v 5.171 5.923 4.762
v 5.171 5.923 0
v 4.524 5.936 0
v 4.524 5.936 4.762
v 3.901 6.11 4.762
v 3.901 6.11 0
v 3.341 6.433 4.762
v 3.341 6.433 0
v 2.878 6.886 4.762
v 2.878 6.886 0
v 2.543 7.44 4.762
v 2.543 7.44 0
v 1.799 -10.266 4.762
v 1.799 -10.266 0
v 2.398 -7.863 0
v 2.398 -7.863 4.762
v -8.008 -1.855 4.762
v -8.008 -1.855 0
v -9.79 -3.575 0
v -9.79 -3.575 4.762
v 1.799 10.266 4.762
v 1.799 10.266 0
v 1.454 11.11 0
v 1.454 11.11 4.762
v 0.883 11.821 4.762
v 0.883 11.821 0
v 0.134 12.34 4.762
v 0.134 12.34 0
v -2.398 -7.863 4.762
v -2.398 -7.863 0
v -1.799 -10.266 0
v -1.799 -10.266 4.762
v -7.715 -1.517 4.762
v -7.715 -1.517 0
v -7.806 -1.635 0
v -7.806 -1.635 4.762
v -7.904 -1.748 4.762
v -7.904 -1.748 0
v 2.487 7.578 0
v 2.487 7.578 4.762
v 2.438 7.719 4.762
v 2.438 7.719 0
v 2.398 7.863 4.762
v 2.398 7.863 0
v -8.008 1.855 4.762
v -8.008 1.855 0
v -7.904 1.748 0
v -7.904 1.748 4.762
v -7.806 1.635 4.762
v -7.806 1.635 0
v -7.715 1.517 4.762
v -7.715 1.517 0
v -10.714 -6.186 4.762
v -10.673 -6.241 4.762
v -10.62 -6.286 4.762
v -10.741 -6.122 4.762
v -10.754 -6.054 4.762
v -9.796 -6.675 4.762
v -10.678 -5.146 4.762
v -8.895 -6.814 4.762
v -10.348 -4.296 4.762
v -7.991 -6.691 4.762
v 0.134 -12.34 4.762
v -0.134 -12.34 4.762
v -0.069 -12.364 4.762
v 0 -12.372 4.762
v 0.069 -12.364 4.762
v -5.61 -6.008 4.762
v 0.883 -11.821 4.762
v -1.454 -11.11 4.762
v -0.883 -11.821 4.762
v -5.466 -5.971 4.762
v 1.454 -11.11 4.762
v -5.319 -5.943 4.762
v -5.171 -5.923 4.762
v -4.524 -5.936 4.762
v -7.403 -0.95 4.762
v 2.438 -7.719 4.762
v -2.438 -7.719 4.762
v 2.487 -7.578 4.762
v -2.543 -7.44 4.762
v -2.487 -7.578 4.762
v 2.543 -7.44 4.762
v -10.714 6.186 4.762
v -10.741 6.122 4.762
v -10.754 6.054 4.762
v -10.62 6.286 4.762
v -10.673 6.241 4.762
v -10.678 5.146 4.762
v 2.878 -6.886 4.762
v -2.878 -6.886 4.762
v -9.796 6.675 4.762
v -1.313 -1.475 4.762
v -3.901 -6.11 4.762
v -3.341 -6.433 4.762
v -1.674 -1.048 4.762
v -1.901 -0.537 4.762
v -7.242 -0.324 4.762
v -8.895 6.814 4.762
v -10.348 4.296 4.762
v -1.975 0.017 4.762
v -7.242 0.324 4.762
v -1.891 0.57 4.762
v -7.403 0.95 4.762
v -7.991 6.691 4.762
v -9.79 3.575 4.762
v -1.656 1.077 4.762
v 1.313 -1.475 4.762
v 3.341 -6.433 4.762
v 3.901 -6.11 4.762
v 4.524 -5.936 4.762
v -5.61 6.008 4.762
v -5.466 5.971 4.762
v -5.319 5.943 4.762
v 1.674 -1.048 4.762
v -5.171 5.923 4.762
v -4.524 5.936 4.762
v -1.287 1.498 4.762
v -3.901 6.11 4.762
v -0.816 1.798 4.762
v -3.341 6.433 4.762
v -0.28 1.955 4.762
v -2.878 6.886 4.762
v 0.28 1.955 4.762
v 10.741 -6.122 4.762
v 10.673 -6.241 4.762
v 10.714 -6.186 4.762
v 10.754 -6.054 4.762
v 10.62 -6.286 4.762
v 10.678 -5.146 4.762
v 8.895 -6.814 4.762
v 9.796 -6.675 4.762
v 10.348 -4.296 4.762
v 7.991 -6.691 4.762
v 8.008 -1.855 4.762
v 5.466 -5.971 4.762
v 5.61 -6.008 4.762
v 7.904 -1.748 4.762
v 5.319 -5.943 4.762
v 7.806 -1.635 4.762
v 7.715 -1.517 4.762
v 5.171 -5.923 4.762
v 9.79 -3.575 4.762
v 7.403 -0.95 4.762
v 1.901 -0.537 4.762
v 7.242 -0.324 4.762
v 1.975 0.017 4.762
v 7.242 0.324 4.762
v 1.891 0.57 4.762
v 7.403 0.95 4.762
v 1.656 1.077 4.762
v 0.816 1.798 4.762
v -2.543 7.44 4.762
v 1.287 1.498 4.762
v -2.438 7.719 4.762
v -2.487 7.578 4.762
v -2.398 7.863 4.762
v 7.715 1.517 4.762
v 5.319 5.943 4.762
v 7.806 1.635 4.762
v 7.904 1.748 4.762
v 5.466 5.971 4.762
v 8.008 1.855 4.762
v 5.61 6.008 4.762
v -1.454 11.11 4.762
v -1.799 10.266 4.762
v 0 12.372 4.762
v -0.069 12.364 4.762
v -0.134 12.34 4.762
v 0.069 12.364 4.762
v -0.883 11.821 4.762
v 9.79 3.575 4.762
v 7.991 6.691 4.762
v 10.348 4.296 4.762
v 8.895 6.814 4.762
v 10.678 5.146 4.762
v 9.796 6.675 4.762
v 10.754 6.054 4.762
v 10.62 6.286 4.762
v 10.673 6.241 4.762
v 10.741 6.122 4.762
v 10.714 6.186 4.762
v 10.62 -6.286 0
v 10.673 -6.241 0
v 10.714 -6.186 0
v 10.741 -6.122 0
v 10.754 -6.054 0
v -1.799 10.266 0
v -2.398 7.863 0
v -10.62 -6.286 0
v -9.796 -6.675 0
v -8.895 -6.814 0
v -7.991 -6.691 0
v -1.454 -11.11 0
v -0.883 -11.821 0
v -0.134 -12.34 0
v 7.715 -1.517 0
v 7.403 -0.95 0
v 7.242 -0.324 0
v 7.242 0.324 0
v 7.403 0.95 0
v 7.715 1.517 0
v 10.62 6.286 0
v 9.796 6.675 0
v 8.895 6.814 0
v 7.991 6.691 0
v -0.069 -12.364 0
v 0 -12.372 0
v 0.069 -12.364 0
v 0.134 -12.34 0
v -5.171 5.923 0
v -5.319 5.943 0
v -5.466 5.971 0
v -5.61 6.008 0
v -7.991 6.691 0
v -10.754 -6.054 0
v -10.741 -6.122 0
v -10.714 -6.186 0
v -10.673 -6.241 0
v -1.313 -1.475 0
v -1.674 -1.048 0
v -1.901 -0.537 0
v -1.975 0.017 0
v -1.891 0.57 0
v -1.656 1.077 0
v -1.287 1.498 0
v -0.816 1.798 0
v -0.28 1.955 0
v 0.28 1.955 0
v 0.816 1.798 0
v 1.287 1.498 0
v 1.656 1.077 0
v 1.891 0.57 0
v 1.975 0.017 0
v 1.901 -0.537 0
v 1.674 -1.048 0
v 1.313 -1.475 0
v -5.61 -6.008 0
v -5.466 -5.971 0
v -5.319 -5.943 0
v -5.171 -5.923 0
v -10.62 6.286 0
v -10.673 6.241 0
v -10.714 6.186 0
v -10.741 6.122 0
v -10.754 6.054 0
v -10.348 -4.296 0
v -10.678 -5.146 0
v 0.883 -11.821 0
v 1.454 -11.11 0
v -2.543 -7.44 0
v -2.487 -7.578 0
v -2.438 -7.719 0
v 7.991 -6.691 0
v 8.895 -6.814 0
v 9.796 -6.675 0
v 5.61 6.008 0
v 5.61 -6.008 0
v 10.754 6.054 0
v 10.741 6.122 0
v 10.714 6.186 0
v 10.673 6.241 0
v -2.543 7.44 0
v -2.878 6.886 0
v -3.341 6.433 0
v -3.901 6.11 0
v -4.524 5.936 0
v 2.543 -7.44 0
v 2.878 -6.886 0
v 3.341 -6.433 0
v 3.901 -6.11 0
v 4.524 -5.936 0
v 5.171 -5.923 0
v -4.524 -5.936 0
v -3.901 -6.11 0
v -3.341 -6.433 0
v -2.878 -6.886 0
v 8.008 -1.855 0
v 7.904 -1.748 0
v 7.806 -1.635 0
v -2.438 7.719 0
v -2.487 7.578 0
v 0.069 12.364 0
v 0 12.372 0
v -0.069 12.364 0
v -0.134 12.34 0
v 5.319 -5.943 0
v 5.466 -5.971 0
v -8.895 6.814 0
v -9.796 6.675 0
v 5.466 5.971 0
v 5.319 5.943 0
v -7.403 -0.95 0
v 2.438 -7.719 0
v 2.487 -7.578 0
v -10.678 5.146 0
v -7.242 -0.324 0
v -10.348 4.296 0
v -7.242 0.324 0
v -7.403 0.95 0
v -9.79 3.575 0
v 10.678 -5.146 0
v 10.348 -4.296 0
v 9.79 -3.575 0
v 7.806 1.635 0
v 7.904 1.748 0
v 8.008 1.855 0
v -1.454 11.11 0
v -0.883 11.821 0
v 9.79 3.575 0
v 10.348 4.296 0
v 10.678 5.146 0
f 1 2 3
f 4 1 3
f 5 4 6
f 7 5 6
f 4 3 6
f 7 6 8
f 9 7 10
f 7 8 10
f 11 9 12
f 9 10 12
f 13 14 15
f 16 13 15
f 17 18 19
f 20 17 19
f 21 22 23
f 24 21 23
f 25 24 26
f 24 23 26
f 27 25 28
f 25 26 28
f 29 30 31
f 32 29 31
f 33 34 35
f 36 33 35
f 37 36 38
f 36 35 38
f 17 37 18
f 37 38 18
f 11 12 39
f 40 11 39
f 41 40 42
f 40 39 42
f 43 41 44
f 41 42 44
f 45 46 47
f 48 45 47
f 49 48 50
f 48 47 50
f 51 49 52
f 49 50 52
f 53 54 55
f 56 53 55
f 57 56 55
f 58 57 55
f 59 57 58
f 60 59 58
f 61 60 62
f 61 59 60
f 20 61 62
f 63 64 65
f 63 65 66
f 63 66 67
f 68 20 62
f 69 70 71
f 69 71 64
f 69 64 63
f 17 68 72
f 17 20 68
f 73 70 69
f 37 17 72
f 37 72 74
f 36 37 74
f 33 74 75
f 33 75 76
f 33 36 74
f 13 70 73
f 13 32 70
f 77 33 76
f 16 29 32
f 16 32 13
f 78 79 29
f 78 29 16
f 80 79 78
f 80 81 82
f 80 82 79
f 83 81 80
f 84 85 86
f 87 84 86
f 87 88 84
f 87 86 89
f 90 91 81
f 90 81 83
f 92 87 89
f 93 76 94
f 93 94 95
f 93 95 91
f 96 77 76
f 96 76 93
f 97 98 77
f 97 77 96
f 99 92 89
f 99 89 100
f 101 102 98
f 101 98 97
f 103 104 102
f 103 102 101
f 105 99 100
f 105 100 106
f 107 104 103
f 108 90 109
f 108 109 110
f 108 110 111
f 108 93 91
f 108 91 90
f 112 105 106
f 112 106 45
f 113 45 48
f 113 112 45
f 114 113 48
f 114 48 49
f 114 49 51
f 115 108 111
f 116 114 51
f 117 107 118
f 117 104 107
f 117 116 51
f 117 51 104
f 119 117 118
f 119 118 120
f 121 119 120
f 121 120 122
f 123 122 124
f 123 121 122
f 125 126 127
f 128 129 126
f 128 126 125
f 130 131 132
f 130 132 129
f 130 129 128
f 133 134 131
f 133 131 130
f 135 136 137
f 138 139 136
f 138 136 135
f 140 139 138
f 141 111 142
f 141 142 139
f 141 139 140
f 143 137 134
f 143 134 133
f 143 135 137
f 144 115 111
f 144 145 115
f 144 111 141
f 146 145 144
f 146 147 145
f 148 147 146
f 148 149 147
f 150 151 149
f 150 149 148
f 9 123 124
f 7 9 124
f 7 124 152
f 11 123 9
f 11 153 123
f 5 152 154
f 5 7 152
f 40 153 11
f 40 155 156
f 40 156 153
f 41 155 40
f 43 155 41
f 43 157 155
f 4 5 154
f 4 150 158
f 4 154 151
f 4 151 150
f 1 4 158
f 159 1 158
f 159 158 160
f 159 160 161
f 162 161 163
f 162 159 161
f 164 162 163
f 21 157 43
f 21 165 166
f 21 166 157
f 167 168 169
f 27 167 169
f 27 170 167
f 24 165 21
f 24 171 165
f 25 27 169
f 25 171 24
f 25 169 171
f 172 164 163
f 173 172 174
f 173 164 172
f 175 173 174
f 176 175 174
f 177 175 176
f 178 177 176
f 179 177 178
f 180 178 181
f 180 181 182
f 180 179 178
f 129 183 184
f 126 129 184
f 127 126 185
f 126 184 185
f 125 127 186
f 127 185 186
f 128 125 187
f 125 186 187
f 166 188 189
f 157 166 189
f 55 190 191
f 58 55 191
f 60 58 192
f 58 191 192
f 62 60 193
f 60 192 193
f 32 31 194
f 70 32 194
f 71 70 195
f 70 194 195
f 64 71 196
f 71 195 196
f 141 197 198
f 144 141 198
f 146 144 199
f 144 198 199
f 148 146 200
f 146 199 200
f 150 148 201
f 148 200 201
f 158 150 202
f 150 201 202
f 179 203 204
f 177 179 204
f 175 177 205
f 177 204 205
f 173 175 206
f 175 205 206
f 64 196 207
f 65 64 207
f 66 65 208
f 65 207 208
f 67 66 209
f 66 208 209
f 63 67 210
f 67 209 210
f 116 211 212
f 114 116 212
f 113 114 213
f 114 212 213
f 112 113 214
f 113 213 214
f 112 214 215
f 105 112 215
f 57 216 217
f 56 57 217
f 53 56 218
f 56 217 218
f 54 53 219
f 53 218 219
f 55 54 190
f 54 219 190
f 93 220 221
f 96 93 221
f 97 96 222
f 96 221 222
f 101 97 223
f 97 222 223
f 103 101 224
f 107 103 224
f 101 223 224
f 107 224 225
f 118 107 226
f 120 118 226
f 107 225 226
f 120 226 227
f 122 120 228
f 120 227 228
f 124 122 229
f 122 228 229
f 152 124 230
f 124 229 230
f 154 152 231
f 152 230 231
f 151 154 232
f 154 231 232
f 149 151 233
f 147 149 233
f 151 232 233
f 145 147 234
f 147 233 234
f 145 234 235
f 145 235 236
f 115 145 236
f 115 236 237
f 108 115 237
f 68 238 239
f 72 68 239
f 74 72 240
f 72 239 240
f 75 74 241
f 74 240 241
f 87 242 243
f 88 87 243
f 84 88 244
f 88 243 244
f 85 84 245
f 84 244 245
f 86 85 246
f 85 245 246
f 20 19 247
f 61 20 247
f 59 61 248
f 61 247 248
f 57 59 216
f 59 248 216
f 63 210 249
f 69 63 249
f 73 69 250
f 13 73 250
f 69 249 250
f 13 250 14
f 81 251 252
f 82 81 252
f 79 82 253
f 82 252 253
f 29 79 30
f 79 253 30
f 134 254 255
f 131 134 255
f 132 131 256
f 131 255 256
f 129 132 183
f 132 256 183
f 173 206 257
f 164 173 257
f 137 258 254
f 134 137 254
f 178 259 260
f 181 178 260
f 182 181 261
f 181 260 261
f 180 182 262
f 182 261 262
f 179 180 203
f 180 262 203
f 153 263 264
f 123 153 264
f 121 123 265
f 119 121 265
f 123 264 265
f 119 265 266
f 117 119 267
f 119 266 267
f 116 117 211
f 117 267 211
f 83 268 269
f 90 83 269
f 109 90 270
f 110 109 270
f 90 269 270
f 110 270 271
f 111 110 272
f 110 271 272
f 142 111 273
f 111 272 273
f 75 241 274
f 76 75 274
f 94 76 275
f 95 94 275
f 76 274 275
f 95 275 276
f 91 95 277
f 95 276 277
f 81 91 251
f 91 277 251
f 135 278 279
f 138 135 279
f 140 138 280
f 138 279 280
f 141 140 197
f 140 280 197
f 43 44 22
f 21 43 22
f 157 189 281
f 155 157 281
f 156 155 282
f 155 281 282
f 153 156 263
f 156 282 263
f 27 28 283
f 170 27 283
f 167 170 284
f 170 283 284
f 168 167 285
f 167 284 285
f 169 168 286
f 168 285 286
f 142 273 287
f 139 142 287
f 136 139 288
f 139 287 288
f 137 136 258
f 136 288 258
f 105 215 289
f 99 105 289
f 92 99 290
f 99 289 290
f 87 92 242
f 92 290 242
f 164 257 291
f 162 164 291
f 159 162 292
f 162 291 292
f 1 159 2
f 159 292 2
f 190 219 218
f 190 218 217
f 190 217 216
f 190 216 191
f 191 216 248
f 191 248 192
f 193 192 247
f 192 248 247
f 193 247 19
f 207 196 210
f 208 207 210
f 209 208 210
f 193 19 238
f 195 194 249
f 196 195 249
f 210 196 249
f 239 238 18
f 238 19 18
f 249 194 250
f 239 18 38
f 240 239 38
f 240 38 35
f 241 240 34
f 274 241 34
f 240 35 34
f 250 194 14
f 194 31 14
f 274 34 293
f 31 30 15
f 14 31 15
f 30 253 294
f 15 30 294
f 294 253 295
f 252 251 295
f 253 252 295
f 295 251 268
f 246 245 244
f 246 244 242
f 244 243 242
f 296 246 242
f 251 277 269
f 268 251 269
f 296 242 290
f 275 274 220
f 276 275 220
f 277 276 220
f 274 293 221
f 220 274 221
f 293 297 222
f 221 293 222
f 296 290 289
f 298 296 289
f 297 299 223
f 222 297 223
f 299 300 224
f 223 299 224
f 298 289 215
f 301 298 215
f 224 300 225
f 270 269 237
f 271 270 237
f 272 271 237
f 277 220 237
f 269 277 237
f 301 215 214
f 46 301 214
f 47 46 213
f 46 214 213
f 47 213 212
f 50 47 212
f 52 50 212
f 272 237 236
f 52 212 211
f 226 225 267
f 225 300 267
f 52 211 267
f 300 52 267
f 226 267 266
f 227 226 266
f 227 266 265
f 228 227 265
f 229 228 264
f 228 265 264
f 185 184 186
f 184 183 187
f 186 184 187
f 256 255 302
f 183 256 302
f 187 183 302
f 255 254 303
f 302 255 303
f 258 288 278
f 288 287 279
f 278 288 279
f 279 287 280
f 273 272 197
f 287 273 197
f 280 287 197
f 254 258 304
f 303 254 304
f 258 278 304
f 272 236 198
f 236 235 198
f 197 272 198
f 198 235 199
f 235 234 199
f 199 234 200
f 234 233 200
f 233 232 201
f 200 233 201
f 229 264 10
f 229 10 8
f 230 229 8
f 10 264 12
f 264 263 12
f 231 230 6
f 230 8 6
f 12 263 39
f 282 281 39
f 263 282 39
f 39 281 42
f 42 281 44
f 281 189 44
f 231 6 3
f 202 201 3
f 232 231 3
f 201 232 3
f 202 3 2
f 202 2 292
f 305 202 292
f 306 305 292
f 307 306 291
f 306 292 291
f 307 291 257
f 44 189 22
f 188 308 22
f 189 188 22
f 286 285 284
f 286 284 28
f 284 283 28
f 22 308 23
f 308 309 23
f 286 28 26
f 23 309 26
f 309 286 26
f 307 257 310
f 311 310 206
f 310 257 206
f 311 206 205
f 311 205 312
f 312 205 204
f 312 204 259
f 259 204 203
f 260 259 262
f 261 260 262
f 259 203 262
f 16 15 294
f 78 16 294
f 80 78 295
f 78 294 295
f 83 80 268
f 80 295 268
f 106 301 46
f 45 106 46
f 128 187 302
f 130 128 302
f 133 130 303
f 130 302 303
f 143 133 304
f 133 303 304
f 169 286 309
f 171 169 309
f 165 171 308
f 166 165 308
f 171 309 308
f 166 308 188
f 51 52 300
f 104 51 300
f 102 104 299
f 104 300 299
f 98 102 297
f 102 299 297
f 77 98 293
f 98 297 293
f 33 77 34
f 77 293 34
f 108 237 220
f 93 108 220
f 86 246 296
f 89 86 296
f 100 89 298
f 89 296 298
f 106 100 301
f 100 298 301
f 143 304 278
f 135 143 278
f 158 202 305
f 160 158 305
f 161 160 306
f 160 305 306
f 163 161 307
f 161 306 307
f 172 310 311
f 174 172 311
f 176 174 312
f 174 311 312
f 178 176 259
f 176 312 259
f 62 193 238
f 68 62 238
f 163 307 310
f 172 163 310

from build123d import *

# Parameters (mm, degrees)
BOSS_EXTRUDE1_DEPTH = 4.7625


with BuildPart() as part:
    # Sketch1 → Boss-Extrude1 (new body)
    with BuildSketch(Plane.XY):
        with BuildLine():
            ThreePointArc((0.13375119, -12.340042072), (1.193950707, -11.485860744), (1.798906697, -10.266157088))
            Line((1.798906697, -10.266157088), (2.398140588, -7.862761221))
            ThreePointArc((2.398140588, -7.862761221), (2.461635419, -7.64822635), (2.543491476, -7.440004377))
            ThreePointArc((2.543491476, -7.440004377), (3.61061, -6.253759966), (5.171487057, -5.922730421))
            ThreePointArc((5.171487057, -5.922730421), (5.392740604, -5.955951983), (5.610280667, -6.008231282))
            Line((5.610280667, -6.008231282), (7.991299489, -6.690977442))
            ThreePointArc((7.991299489, -6.690977442), (9.350071835, -6.776922016), (10.619914323, -6.285852964))
            ThreePointArc((10.619914323, -6.285852964), (10.714040096, -6.185753934), (10.753665513, -6.054189108))
            ThreePointArc((10.753665513, -6.054189108), (10.544022542, -4.708938729), (9.790206185, -3.575179646))
            Line((9.790206185, -3.575179646), (8.008421255, -1.854529939))
            ThreePointArc((8.008421255, -1.854529939), (7.854376023, -1.692274367), (7.714978533, -1.517273956))
            ThreePointArc((7.714978533, -1.517273956), (7.22122, 0), (7.714978533, 1.517273956))
            ThreePointArc((7.714978533, 1.517273956), (7.854376023, 1.692274367), (8.008421255, 1.854529939))
            Line((8.008421255, 1.854529939), (9.790205754, 3.575179229))
            ThreePointArc((9.790205754, 3.575179229), (10.544022434, 4.708938449), (10.753665513, 6.054189108))
            ThreePointArc((10.753665513, 6.054189108), (10.714040096, 6.185753934), (10.619914323, 6.285852964))
            ThreePointArc((10.619914323, 6.285852964), (9.350071835, 6.776922015), (7.991299489, 6.690977442))
            Line((7.991299489, 6.690977442), (5.610280667, 6.008231282))
            ThreePointArc((5.610280667, 6.008231282), (5.392740604, 5.955951983), (5.171487057, 5.922730421))
            ThreePointArc((5.171487057, 5.922730421), (3.61061, 6.253759966), (2.543491476, 7.440004377))
            ThreePointArc((2.543491476, 7.440004377), (2.461635419, 7.64822635), (2.398140588, 7.862761221))
            Line((2.398140588, 7.862761221), (1.798906697, 10.266157088))
            ThreePointArc((1.798906697, 10.266157088), (1.193950707, 11.485860744), (0.13375119, 12.340042072))
            ThreePointArc((0.13375119, 12.340042072), (0, 12.371507867), (-0.13375119, 12.340042072))
            ThreePointArc((-0.13375119, 12.340042072), (-1.193950707, 11.485860744), (-1.798906697, 10.266157088))
            Line((-1.798906697, 10.266157088), (-2.398140588, 7.862761221))
            ThreePointArc((-2.398140588, 7.862761221), (-2.461635419, 7.64822635), (-2.543491476, 7.440004377))
            ThreePointArc((-2.543491476, 7.440004377), (-3.61061, 6.253759966), (-5.171487057, 5.922730421))
            ThreePointArc((-5.171487057, 5.922730421), (-5.392740604, 5.955951983), (-5.610280667, 6.008231282))
            Line((-5.610280667, 6.008231282), (-7.991299489, 6.690977442))
            ThreePointArc((-7.991299489, 6.690977442), (-9.350071835, 6.776922016), (-10.619914323, 6.285852964))
            ThreePointArc((-10.619914323, 6.285852964), (-10.714040096, 6.185753934), (-10.753665513, 6.054189108))
            ThreePointArc((-10.753665513, 6.054189108), (-10.544022542, 4.708938729), (-9.790206185, 3.575179646))
            Line((-9.790206185, 3.575179646), (-8.008421255, 1.854529939))
            ThreePointArc((-8.008421255, 1.854529939), (-7.854376023, 1.692274367), (-7.714978533, 1.517273956))
            ThreePointArc((-7.714978533, 1.517273956), (-7.22122, 0), (-7.714978533, -1.517273956))
            ThreePointArc((-7.714978533, -1.517273956), (-7.854376023, -1.692274367), (-8.008421255, -1.854529939))
            Line((-8.008421255, -1.854529939), (-9.790205754, -3.575179229))
            ThreePointArc((-9.790205754, -3.575179229), (-10.544022434, -4.708938449), (-10.753665513, -6.054189108))
            ThreePointArc((-10.753665513, -6.054189108), (-10.714040096, -6.185753934), (-10.619914323, -6.285852964))
            ThreePointArc((-10.619914323, -6.285852964), (-9.350071835, -6.776922015), (-7.991299489, -6.690977442))
            Line((-7.991299489, -6.690977442), (-5.610280667, -6.008231282))
            ThreePointArc((-5.610280667, -6.008231282), (-5.392740604, -5.955951983), (-5.171487057, -5.922730421))
            ThreePointArc((-5.171487057, -5.922730421), (-3.61061, -6.253759966), (-2.543491476, -7.440004377))
            ThreePointArc((-2.543491476, -7.440004377), (-2.461635419, -7.64822635), (-2.398140588, -7.862761221))
            Line((-2.398140588, -7.862761221), (-1.798906697, -10.266157088))
            ThreePointArc((-1.798906697, -10.266157088), (-1.193950707, -11.485860744), (-0.13375119, -12.340042072))
            ThreePointArc((-0.13375119, -12.340042072), (0, -12.371507867), (0.13375119, -12.340042072))
        make_face()
        with BuildLine():
            Line((1.313392554, -1.475), (-1.313392554, -1.475))
            ThreePointArc((-1.313392554, -1.475), (0, 1.975), (1.313392554, -1.475))
        make_face(mode=Mode.SUBTRACT)
    extrude(amount=BOSS_EXTRUDE1_DEPTH)


solid = part.part
